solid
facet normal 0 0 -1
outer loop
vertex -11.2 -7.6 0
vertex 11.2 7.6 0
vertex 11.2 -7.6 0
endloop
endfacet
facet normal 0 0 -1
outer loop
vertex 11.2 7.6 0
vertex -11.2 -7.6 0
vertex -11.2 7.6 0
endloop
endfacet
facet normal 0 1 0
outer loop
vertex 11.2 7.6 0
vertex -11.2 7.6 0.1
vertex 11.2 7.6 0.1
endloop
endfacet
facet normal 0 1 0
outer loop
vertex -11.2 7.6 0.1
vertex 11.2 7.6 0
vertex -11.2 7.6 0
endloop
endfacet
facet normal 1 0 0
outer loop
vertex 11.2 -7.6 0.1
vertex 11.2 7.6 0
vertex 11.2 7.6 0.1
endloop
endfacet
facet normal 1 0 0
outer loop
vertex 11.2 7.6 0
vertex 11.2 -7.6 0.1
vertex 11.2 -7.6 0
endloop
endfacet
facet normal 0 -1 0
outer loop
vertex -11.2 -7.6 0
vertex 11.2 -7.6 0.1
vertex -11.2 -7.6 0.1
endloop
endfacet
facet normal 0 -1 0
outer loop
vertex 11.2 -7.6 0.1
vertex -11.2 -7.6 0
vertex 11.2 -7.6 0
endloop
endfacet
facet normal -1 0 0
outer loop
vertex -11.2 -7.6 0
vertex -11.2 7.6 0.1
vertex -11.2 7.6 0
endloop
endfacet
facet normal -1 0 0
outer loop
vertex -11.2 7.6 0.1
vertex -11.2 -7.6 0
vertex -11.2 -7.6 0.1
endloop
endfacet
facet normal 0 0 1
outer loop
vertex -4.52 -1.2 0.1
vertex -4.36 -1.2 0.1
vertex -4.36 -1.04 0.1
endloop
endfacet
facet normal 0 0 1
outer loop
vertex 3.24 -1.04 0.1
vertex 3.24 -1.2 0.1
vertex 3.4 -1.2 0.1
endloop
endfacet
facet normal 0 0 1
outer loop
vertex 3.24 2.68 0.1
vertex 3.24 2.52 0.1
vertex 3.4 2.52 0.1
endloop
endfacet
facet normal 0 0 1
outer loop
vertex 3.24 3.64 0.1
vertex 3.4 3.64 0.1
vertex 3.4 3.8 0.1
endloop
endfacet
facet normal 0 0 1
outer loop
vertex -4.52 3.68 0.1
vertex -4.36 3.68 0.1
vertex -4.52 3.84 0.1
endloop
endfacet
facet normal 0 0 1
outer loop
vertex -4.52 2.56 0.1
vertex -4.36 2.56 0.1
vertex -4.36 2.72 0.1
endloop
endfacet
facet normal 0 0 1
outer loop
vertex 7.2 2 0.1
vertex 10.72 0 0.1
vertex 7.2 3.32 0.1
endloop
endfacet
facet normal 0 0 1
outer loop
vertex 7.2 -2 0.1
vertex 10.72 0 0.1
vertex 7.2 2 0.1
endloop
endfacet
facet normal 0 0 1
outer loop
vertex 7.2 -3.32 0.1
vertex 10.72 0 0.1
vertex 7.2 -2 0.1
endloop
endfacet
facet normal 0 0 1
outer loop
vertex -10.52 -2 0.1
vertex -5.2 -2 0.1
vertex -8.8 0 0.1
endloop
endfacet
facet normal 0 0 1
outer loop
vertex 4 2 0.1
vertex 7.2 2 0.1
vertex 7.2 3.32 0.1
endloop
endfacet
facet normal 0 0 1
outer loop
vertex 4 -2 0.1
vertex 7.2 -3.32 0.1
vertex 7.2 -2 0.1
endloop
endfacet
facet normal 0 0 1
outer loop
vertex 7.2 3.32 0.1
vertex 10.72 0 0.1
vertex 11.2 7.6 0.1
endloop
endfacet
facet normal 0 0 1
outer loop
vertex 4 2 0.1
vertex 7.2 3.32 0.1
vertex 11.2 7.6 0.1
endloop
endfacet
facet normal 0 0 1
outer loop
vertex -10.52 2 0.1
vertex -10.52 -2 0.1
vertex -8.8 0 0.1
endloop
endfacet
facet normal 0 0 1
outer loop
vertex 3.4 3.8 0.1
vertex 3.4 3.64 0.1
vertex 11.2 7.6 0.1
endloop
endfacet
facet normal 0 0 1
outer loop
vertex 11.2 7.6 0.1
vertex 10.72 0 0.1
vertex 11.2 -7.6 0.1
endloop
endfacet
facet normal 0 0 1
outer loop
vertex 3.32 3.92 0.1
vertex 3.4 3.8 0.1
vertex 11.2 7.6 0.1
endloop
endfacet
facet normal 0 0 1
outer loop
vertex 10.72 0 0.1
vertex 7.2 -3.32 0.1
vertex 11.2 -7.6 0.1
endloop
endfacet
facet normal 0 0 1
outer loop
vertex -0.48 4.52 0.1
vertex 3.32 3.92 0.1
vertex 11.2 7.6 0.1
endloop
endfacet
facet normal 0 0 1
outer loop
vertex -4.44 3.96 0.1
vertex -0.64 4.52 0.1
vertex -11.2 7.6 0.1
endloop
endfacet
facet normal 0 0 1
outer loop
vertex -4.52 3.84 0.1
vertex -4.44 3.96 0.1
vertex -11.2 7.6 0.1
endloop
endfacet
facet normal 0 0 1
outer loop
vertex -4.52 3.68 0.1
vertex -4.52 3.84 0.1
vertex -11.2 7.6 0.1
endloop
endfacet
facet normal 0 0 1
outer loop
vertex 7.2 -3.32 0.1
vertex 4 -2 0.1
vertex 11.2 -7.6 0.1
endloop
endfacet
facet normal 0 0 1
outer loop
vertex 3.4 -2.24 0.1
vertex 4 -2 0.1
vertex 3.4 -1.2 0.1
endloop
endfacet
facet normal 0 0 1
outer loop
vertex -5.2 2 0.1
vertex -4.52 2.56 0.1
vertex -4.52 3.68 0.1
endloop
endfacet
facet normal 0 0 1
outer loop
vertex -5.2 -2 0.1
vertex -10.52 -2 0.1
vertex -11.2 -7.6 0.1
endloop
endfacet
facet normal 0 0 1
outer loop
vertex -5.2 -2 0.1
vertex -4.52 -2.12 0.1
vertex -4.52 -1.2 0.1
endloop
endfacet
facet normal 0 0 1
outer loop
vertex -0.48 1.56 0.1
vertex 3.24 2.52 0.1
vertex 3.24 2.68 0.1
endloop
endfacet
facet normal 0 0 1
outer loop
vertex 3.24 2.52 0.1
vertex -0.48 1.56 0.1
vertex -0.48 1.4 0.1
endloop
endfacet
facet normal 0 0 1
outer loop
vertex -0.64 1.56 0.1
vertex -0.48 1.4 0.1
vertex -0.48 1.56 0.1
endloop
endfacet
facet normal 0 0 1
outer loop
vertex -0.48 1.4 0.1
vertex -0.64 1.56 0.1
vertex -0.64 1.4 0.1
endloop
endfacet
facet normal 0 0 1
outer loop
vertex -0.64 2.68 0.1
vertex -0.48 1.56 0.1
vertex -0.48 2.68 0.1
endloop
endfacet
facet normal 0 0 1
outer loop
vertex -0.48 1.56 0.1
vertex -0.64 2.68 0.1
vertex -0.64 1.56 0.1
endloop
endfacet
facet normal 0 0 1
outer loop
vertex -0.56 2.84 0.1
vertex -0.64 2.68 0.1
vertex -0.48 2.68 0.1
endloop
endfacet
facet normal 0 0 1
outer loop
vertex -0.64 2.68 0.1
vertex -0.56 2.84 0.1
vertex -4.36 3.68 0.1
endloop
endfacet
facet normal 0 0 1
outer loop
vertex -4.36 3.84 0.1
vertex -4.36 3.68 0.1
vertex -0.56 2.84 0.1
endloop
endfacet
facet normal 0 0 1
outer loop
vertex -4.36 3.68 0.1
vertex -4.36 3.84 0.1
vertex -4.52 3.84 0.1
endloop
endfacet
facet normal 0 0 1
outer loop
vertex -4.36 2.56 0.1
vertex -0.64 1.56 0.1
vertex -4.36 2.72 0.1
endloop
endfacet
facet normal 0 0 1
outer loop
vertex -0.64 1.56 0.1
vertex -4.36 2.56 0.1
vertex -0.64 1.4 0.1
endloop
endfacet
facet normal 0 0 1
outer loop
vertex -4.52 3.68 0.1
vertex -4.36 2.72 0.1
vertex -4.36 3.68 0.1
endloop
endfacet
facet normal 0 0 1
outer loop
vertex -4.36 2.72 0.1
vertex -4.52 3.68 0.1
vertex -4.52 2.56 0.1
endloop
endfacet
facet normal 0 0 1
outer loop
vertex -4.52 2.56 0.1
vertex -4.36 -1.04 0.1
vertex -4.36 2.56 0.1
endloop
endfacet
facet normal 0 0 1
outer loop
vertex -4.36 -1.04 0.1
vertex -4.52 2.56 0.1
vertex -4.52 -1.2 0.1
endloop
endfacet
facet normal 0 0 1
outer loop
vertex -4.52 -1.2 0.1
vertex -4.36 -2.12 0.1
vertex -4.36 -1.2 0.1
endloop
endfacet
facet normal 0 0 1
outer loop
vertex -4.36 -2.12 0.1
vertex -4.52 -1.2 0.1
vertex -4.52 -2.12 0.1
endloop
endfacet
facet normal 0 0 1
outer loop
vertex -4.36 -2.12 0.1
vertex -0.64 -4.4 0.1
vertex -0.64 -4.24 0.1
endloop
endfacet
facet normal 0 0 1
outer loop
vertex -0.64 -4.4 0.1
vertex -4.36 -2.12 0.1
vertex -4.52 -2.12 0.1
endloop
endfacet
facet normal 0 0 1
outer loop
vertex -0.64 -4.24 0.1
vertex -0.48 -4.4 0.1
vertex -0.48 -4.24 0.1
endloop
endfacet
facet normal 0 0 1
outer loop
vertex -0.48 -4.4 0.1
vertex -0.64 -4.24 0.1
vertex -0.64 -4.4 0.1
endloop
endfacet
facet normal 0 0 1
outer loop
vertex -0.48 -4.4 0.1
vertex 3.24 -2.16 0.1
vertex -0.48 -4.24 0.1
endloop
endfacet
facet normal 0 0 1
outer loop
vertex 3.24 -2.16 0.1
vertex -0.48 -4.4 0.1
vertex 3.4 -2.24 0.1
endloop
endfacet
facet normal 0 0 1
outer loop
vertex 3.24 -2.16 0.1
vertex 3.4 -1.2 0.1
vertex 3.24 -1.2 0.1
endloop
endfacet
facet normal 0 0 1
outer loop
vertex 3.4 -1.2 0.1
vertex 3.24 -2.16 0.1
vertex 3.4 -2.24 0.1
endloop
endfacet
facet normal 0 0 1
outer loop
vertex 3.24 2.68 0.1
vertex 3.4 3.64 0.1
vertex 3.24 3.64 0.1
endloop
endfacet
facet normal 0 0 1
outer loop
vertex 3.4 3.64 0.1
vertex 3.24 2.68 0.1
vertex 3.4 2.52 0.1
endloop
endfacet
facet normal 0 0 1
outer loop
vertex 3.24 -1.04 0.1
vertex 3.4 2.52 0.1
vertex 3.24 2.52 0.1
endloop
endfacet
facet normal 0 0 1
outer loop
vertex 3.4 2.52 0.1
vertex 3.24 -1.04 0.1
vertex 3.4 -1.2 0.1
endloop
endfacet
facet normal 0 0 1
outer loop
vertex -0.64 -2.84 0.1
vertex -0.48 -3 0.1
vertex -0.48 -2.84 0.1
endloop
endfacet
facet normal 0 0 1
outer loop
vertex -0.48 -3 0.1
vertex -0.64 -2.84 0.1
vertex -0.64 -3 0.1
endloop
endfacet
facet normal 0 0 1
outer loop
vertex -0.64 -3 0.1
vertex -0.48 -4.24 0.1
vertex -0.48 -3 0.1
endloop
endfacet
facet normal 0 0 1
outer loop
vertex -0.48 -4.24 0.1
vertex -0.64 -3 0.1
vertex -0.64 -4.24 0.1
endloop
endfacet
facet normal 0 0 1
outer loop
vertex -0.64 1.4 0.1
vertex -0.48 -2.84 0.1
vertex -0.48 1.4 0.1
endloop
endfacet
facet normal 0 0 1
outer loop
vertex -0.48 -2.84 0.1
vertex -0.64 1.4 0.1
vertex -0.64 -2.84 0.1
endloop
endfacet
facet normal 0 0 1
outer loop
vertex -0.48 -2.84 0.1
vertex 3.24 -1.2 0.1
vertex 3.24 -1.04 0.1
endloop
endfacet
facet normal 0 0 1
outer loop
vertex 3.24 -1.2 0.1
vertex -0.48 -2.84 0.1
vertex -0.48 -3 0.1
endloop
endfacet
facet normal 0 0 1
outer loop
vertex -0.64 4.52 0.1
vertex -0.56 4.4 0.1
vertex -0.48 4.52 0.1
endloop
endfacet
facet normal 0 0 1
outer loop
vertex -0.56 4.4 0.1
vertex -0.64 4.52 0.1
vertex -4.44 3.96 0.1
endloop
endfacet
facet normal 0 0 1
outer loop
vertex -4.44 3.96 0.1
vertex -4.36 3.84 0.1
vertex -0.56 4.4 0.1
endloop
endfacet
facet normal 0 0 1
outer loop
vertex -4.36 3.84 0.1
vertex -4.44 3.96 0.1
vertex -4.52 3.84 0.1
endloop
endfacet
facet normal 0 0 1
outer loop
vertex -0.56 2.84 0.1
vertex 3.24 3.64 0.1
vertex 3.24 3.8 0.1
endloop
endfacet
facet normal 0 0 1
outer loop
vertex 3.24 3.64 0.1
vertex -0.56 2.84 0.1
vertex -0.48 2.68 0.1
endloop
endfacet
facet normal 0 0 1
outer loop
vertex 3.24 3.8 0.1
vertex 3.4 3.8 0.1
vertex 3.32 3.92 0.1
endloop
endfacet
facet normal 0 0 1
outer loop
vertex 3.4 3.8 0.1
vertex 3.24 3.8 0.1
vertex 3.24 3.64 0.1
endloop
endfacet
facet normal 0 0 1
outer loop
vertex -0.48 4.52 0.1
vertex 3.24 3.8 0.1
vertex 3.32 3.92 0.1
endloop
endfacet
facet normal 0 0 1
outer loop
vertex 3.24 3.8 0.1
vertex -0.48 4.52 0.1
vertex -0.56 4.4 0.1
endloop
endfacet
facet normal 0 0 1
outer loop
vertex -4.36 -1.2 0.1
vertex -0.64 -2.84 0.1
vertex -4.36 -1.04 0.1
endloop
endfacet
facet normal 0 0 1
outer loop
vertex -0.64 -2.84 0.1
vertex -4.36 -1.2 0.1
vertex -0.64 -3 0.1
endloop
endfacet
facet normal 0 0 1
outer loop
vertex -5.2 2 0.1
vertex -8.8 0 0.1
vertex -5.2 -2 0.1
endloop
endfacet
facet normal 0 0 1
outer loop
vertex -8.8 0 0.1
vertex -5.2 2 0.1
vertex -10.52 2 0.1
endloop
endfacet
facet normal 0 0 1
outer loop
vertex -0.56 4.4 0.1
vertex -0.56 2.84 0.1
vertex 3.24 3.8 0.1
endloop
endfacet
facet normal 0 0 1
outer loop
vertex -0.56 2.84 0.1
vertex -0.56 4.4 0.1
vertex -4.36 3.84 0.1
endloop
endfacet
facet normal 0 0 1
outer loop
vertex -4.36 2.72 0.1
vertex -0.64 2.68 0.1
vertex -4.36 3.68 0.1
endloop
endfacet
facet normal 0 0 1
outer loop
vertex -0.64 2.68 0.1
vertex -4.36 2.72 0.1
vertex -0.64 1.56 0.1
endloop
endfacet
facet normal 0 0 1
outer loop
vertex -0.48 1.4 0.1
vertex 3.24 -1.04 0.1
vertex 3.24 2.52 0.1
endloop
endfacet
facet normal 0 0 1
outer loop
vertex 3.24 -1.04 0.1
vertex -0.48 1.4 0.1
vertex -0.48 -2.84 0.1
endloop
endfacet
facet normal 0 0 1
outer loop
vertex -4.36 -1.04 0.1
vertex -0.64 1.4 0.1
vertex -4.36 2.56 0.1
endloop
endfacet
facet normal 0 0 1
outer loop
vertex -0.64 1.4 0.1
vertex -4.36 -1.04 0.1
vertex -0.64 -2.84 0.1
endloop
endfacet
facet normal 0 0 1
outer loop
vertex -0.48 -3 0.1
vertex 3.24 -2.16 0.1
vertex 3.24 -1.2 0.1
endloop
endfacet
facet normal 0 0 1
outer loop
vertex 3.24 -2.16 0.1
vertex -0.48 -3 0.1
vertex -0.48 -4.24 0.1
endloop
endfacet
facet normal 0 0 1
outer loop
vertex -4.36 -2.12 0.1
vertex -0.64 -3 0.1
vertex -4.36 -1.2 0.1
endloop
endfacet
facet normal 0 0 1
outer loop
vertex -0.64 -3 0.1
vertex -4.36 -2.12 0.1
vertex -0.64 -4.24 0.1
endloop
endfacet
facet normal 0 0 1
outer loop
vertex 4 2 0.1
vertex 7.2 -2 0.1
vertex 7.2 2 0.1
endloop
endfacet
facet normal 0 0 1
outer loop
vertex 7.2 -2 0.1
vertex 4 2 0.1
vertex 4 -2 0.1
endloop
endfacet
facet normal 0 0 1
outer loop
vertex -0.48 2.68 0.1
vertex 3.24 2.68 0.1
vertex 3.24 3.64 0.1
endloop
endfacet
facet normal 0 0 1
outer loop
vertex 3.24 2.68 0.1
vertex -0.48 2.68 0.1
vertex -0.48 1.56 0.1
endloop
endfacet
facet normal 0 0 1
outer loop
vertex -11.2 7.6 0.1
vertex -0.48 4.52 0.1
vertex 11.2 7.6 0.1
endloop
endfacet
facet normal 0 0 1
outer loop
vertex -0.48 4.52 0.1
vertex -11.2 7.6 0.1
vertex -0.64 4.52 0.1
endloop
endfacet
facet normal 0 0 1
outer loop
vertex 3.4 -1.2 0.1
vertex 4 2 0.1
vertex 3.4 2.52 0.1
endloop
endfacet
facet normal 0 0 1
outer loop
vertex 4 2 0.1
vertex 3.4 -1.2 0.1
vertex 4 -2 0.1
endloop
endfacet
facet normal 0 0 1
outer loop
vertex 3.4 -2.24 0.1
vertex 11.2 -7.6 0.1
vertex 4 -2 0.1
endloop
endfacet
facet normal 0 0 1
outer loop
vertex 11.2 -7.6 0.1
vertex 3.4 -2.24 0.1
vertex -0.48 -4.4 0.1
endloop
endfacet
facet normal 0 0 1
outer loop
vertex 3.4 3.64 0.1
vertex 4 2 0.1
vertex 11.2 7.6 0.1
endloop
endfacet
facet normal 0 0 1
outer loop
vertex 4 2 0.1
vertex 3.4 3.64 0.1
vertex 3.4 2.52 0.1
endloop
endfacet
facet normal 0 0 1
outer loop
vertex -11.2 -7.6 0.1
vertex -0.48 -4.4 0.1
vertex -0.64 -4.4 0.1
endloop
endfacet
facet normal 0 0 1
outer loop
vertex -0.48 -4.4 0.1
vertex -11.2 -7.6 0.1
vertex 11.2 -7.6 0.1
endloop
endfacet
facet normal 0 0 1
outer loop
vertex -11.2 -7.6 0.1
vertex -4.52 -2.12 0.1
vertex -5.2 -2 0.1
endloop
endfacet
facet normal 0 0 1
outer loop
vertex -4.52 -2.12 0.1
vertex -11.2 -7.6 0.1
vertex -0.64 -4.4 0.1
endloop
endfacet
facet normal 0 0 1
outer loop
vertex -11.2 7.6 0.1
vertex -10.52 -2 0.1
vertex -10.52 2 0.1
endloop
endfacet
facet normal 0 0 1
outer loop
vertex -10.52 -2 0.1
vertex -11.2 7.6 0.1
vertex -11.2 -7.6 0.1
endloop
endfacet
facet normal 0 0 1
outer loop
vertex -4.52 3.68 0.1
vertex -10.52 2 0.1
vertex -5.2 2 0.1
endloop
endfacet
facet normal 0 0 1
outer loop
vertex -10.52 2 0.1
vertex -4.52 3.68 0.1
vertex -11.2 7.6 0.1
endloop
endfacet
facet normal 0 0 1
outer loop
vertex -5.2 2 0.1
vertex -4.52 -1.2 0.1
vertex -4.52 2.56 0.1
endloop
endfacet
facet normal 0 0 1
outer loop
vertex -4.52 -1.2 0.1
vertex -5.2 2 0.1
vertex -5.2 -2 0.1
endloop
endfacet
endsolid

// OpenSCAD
// file: ../p/box5-12.scad
use <../lib.scad>
function ldraw_lib__box5_12() = [
// 0 Box with 5 Faces without Any Edges
// 0 Name: box5-12.dat
// 0 Author: Chris Dee [cwdee]
// 0 !LDRAW_ORG Primitive UPDATE 2009-02
// 0 !LICENSE Licensed under CC BY 2.0 and CC BY 4.0 : see CAreadme.txt
// 
// 0 BFC CERTIFY CCW
  [0,"BFC","CERTIFY"],
  [0,"BFC","CCW"],
// 
// 0 !HISTORY 2009-09-03 [PTadmin] Official Update 2009-02
// 
// 
// 4 16 1 1 1 1 1 -1 -1 1 -1 -1 1 1
  [4,16,1,1,1,1,1,-1,-1,1,-1,-1,1,1],
// 4 16 -1 0 1 1 0 1 1 1 1 -1 1 1
  [4,16,-1,0,1,1,0,1,1,1,1,-1,1,1],
// 4 16 -1 0 -1 -1 0 1 -1 1 1 -1 1 -1
  [4,16,-1,0,-1,-1,0,1,-1,1,1,-1,1,-1],
// 4 16 1 0 -1 -1 0 -1 -1 1 -1 1 1 -1
  [4,16,1,0,-1,-1,0,-1,-1,1,-1,1,1,-1],
// 4 16 1 0 1 1 0 -1 1 1 -1 1 1 1
  [4,16,1,0,1,1,0,-1,1,1,-1,1,1,1],
// 0
];
module ldraw_lib__box5_12(step=0, col=false, unit=2/5, alt=false, line=0.2, solid=!$preview)
    makepoly(ldraw_lib__box5_12(), step=step, col=col, unit=unit, alt=alt, line=line, solid=solid);
ldraw_lib__box5_12(line=0.2);
// main file
use <../lib.scad>
use <195075b.scad>
function ldraw_lib__195075a() = [
// 0 Sticker  1.9 x  2.8 with Yellow Box and Arrow Right
// 0 Name: 195075a.dat
// 0 Author: Bjoern Sigve Storesund [Storesund]
// 0 !LDRAW_ORG Part UPDATE 2017-01
// 0 !LICENSE Licensed under CC BY 2.0 and CC BY 4.0 : see CAreadme.txt
// 
// 0 BFC CERTIFY CCW
  [0,"BFC","CERTIFY"],
  [0,"BFC","CCW"],
// 
// 0 !KEYWORDS Delivery Van, Set 6624
// 
// 0 !HISTORY 2017-12-30 [PTadmin] Official Update 2017-01
// 
// 
// 1 16 0 0 0 -1 0 0 0 1 0 0 0 1 195075b.dat
  [1,16,0,0,0,-1,0,0,0,1,0,0,0,1, ldraw_lib__195075b()],
];
module ldraw_lib__195075a(step=0, col=false, unit=2/5, alt=false, line=0.2, solid=!$preview)
    makepoly(ldraw_lib__195075a(), step=step, col=col, unit=unit, alt=alt, line=line, solid=solid);
ldraw_lib__195075a(line=0.2);
